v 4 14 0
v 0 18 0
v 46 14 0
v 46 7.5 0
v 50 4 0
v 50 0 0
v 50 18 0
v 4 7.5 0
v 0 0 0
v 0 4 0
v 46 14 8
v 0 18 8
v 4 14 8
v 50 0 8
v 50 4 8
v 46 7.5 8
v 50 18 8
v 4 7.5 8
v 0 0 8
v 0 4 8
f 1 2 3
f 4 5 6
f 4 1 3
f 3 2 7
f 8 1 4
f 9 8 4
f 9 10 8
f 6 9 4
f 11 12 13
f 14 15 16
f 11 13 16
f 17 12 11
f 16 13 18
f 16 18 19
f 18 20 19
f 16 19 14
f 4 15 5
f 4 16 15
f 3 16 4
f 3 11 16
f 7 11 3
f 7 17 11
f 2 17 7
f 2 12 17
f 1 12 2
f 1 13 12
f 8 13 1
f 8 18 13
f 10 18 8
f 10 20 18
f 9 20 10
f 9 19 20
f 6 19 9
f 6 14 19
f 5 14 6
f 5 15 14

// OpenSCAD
$fn = 32;

// ----------------------------------------------------------------------
// Key bar: dovetail key, 8 mm thick
// ----------------------------------------------------------------------

// --- parameters (mm) ---
profile_height = 8;       // extrusion height
profile_points = 10;      // points of the closed outline

profile = [[0, 0], [50, 0], [50, 4], [46, 7.5], [46, 14], [50, 18], [0, 18], [4, 14], [4, 7.5], [0, 4]];  // single closed polygon, 10 points, counter clockwise

// --- the one profile operation ---
linear_extrude(height = profile_height) polygon(points = profile);
